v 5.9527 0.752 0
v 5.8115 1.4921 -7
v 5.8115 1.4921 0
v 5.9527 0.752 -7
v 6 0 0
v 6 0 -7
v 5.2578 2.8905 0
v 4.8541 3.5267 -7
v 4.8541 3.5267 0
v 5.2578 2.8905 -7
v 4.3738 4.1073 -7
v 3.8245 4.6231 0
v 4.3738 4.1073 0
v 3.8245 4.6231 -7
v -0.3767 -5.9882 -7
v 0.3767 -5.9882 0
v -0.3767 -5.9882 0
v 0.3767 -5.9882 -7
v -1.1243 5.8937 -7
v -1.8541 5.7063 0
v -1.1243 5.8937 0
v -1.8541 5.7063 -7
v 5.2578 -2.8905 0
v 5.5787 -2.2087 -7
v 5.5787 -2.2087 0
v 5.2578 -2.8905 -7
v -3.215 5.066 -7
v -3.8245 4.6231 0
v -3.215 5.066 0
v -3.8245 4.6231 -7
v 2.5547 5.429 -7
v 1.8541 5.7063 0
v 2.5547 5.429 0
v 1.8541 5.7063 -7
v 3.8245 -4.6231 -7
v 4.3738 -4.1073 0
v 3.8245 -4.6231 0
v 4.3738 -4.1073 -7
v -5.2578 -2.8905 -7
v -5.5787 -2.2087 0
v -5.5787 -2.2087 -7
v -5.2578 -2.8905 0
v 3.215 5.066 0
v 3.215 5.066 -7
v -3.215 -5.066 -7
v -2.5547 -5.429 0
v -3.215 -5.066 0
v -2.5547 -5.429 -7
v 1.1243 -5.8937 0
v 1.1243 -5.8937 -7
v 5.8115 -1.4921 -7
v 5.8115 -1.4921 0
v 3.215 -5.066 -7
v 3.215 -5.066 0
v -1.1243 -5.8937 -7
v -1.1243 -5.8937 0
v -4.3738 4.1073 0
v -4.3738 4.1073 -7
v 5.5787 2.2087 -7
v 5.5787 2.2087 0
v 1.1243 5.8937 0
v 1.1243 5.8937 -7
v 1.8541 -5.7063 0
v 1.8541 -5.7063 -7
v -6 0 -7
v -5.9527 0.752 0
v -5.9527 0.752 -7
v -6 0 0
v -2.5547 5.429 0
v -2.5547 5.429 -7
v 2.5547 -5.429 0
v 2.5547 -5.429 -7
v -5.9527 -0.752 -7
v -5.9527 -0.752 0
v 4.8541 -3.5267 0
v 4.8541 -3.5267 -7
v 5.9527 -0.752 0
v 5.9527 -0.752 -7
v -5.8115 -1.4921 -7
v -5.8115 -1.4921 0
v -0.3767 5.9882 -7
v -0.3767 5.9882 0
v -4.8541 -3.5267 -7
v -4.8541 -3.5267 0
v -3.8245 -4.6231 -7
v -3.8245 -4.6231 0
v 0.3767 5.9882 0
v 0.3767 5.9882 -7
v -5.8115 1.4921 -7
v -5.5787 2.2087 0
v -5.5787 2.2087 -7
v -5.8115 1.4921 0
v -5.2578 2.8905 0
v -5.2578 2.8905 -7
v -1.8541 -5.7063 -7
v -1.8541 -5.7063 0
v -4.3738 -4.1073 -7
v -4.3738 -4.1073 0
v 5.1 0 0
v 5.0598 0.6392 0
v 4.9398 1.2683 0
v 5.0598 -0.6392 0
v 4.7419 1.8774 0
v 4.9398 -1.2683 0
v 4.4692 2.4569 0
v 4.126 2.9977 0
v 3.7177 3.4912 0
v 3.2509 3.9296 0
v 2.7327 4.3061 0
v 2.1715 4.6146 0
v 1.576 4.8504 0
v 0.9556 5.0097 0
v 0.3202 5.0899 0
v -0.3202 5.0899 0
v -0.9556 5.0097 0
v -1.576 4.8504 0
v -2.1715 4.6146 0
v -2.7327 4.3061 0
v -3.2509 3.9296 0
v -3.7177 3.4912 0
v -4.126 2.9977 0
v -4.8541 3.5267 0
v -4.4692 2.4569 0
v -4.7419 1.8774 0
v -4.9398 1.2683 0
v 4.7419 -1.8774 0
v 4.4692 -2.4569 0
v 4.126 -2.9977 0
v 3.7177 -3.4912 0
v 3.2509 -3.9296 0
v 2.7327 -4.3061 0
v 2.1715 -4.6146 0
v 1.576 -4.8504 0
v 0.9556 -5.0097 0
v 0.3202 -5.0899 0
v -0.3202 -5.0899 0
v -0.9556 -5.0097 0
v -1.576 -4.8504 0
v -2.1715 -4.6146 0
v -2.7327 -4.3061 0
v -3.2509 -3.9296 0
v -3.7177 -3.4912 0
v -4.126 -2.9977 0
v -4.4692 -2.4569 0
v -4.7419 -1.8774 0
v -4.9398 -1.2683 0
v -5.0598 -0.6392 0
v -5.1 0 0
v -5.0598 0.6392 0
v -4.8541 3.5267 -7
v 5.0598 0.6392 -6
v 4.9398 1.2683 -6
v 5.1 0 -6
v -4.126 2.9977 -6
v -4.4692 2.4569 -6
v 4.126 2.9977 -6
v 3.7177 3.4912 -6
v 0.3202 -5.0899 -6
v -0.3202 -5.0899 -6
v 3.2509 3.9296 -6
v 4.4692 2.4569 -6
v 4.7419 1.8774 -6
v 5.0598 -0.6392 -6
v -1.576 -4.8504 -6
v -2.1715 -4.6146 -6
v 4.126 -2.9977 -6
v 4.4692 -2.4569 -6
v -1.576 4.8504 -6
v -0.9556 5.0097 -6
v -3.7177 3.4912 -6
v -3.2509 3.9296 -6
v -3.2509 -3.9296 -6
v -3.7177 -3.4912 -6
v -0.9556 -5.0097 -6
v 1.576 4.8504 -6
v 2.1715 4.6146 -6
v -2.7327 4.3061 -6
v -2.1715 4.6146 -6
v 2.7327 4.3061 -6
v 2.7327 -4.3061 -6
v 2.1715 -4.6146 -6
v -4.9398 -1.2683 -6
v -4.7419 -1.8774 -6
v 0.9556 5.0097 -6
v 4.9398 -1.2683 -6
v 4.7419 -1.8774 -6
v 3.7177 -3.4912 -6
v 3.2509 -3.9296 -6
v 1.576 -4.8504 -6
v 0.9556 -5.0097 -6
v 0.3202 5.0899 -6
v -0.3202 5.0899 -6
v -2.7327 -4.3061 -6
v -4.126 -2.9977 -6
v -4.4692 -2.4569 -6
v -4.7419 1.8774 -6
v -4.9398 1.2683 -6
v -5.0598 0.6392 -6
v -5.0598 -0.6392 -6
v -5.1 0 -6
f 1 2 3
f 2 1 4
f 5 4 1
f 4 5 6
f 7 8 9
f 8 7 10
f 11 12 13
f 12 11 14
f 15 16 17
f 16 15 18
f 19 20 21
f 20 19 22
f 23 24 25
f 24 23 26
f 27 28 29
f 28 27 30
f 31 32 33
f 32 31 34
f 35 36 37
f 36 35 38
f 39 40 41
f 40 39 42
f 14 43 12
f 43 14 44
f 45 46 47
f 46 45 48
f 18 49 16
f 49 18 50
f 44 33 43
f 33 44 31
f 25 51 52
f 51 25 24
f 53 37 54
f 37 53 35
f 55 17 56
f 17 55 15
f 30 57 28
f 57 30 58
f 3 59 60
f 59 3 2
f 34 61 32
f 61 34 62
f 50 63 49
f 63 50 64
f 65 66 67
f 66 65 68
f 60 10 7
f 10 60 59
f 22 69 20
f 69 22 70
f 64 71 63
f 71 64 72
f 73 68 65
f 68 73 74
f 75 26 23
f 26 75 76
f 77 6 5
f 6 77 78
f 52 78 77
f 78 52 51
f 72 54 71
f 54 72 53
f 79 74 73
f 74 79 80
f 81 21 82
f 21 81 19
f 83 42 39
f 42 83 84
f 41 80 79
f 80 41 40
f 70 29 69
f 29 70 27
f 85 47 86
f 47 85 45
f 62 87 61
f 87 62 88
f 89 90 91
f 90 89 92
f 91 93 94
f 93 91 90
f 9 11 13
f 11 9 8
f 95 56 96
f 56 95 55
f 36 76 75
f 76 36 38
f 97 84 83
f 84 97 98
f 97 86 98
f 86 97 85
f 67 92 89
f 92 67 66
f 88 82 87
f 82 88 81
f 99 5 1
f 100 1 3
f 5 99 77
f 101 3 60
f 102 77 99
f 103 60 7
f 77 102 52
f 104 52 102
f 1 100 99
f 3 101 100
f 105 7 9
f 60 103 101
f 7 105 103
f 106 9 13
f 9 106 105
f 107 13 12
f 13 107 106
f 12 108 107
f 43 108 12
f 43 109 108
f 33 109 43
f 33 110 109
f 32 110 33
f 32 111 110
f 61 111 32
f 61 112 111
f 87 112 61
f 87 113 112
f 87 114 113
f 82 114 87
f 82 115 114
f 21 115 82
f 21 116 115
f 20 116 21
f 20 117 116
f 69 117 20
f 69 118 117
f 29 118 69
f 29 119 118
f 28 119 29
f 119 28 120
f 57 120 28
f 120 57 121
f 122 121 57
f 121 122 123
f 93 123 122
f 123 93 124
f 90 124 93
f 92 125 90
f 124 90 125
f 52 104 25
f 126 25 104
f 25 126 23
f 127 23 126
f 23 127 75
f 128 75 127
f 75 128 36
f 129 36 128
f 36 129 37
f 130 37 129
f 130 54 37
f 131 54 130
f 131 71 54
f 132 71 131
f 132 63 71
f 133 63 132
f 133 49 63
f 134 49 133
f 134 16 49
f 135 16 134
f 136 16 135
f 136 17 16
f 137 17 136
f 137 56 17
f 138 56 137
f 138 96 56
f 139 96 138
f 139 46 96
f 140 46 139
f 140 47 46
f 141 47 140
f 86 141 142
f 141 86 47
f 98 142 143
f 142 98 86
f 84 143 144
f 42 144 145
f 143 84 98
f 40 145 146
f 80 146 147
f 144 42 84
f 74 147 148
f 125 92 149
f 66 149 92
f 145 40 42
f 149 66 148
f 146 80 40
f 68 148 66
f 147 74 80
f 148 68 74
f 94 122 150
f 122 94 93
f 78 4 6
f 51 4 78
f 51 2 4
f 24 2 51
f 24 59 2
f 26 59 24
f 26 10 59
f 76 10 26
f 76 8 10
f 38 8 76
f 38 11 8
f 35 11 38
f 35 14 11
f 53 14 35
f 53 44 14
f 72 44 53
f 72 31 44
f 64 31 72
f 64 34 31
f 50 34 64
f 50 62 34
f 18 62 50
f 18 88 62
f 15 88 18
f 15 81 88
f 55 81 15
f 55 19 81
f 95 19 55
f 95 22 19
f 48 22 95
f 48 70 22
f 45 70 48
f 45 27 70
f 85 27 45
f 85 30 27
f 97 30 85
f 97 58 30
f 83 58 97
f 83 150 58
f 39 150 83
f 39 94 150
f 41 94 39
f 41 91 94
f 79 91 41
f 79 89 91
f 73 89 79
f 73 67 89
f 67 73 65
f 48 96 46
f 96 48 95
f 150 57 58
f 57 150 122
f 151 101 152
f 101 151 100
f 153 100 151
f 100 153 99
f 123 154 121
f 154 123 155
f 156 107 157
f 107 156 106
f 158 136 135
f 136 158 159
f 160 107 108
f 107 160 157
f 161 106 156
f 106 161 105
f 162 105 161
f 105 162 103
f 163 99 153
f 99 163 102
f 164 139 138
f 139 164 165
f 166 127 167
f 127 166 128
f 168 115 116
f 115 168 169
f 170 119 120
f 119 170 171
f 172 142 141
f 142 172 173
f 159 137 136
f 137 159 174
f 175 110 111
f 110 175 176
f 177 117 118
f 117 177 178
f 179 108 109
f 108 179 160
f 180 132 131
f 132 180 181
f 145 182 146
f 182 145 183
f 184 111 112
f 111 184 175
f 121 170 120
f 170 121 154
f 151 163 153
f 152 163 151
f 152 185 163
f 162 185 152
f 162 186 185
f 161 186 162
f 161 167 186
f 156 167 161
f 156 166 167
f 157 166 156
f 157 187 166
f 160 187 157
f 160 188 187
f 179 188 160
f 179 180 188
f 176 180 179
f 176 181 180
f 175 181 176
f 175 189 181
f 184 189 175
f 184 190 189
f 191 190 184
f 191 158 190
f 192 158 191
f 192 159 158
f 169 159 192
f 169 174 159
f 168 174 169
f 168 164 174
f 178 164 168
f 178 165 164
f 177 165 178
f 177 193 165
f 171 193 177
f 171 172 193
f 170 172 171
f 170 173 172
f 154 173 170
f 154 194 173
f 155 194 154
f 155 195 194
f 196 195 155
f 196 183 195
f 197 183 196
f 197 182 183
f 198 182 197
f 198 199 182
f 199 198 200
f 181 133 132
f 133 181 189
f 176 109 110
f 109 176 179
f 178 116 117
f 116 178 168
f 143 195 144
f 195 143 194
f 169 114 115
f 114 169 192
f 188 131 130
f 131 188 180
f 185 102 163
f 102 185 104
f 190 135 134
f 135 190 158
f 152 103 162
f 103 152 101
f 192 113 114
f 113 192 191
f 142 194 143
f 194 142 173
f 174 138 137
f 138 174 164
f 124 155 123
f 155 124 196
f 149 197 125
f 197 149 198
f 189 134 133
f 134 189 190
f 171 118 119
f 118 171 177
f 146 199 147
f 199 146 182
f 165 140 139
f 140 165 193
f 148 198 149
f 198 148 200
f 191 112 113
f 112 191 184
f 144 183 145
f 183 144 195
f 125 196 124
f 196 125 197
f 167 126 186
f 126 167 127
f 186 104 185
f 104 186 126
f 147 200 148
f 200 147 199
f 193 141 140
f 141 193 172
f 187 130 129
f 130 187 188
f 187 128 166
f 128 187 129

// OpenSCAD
$fn = 50;


difference() {
	union() {
		translate(v = [0, 0, -7.0000000000]) {
			cylinder(h = 7, r = 6.0000000000);
		}
	}
	union() {
		#translate(v = [0, 0, -6.0000000000]) {
			cylinder(h = 6, r = 5.1000000000);
		}
	}
}
